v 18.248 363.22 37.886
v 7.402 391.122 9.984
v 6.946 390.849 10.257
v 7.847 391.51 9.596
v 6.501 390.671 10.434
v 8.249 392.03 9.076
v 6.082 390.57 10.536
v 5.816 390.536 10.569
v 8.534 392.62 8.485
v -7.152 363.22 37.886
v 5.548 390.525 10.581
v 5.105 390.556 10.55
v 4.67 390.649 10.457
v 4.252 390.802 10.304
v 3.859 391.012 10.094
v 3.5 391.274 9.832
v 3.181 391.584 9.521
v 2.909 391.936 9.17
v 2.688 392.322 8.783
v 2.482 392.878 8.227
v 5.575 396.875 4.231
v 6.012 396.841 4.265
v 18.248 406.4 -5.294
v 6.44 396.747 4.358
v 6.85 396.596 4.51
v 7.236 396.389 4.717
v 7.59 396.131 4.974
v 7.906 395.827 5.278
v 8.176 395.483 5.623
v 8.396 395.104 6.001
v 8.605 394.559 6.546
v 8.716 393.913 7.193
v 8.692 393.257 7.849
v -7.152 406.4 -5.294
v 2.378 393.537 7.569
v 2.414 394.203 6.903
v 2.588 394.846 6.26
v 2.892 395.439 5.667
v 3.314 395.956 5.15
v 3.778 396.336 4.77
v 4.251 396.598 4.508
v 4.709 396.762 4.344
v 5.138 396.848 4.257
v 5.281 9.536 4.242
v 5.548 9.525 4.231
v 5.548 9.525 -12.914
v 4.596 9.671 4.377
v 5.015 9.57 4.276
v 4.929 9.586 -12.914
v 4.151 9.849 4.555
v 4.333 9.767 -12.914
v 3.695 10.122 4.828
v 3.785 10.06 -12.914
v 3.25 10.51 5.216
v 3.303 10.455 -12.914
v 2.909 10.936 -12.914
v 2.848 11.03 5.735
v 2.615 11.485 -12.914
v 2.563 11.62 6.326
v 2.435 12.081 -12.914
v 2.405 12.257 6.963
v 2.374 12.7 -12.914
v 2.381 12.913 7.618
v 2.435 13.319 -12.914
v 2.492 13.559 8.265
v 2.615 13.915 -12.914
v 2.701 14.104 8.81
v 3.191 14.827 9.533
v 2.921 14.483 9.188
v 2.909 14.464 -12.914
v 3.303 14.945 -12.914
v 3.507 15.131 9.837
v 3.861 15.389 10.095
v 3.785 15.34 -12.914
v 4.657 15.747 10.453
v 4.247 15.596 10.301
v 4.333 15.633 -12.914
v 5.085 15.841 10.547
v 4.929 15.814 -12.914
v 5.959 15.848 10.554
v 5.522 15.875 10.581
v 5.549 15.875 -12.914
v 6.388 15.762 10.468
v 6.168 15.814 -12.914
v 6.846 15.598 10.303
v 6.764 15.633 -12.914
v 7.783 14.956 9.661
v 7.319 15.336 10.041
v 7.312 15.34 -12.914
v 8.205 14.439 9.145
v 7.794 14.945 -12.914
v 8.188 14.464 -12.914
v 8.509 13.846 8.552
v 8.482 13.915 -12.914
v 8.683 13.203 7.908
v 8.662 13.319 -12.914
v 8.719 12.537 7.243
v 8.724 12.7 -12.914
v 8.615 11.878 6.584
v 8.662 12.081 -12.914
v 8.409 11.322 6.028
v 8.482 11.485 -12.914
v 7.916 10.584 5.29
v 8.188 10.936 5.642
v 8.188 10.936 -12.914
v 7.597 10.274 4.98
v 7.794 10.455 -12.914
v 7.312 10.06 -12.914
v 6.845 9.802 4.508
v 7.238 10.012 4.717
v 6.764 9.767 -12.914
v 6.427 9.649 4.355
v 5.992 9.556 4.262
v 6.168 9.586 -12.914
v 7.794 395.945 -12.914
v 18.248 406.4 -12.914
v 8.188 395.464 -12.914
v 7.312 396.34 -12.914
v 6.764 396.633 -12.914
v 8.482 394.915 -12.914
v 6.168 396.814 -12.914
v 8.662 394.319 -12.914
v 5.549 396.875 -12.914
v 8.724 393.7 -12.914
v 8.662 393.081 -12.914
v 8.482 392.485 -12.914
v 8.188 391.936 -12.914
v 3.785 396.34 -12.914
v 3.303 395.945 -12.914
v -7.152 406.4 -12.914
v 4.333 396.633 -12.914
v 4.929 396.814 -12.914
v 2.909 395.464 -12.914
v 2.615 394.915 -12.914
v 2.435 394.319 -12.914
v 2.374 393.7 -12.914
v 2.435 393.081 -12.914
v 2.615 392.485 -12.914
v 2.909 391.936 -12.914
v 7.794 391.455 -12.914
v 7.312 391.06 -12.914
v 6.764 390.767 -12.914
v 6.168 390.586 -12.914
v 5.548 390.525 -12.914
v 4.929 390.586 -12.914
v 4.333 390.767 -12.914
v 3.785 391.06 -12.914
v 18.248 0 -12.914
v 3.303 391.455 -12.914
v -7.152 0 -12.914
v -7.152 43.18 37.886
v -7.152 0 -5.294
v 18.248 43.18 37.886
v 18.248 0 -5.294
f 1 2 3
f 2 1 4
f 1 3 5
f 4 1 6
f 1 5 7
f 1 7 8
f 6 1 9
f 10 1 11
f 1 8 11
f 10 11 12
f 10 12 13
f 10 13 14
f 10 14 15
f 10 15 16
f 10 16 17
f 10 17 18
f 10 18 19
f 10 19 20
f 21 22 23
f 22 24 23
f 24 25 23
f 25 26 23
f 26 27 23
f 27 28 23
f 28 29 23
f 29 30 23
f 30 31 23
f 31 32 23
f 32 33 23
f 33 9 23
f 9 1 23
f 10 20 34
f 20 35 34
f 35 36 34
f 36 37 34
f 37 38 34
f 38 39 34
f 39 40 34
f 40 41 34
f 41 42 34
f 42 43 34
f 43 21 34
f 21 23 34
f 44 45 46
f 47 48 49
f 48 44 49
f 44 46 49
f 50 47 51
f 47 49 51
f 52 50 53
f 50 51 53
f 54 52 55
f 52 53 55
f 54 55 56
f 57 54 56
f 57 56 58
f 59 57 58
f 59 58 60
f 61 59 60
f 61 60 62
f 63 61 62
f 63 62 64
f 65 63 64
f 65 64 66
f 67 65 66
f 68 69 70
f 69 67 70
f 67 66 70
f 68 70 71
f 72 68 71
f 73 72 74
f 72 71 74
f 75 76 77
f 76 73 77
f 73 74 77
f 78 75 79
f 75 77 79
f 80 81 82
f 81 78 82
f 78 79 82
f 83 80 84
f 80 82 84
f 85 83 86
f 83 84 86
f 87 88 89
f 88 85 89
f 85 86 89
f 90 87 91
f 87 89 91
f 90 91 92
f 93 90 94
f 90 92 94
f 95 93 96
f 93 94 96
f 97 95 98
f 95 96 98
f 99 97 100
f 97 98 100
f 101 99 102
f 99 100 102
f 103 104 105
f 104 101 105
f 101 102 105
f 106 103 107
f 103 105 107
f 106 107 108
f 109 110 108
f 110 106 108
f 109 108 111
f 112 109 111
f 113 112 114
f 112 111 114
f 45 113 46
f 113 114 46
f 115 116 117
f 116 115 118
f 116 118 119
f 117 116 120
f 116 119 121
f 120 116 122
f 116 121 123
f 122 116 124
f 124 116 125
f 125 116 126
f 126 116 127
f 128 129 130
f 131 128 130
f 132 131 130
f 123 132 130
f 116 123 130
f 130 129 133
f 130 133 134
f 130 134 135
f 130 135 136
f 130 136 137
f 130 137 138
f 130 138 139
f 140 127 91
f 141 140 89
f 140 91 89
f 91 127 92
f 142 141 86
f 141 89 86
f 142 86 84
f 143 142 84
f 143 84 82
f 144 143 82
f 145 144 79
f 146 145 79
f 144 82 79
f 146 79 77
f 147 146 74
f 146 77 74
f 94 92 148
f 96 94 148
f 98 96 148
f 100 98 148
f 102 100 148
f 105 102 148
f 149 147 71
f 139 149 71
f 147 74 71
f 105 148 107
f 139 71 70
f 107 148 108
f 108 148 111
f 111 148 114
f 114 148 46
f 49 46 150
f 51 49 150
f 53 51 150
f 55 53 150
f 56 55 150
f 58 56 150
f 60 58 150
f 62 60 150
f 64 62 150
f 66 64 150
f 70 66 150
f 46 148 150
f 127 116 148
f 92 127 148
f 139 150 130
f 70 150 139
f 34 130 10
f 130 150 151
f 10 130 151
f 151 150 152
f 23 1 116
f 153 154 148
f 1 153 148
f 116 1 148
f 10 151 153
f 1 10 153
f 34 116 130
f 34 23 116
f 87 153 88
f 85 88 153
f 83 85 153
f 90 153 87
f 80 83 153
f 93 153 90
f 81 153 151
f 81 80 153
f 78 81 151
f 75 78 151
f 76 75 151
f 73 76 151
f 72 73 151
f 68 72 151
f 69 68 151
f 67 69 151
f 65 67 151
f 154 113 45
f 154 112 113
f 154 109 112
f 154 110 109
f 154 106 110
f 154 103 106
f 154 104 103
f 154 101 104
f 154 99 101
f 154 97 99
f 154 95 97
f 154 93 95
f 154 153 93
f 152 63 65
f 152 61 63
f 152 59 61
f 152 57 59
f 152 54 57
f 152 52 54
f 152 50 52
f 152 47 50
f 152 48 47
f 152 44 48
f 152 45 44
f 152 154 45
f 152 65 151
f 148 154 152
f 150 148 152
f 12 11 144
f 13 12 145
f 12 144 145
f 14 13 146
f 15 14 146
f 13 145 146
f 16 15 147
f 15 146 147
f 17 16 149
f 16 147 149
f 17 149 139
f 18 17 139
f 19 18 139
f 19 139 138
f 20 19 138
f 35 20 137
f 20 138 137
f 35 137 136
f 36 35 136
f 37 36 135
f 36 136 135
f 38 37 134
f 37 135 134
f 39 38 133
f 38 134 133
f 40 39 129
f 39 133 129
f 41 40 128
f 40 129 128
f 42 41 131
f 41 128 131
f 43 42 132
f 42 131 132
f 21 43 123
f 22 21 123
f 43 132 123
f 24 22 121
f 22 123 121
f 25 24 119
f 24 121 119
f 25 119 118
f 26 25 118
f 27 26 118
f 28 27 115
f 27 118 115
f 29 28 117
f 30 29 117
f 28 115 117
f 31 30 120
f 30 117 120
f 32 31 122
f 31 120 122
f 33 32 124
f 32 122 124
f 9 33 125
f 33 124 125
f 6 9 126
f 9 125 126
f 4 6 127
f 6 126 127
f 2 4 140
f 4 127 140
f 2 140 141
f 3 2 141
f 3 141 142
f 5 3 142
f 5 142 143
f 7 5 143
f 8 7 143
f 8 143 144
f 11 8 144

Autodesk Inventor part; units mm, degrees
ref_plane "YZ Plane" through (0, 0, 0) normal (1, 0, 0) x (0, 1, 0)
ref_plane "XZ Plane" through (0, 0, 0) normal (0, 1, 0) x (-1, 0, 0)
ref_plane "XY Plane" through (0, 0, 0) normal (0, 0, 1) x (1, 0, 0)
sketch "Sketch1" plane through (0, 0, 0) normal (0, 1, 0) x (-1, 0, 0)
  line L0 (7.1515, 37.8857) -> (-18.2485, 37.8857)
  line L1 (-18.2485, 37.8857) -> (-18.2485, -12.9143)
  line L2 (-18.2485, -12.9143) -> (7.1515, -12.9143)
  line L3 (7.1515, -12.9143) -> (7.1515, 37.8857)
  point P0 (0, 0)
  dimension "d0" = 25.4
  dimension "d1" = 50.8
extrude "Extrusion1" add sketch "Sketch1" along normal blind 406.4
chamfer "Chamfer1" distance 43.18 angle 45 2 edges at (5.5485, 406.4, 37.8857) (5.5485, 0, 37.8857)
sketch "Sketch2" plane through (-7.1515, 43.18, 37.8857) normal (0, 0, 1) x (1, 0, 0)
  circle A0 centre (12.7, 350.52) radius 3.175
  line L0 (25.4, 363.22) -> (0, 363.22) projected
  circle A1 centre (12.7, -30.48) radius 3.175
  line L1 (0, -43.18) -> (25.4, -43.18) projected
  point P0 (7.1515, -43.18)
  dimension "d7" = 6.35
  dimension "d8" = 12.7
  dimension "d9" = 6.35
  dimension "d10" = 12.7
hole "Hole1" at (5.5485, 393.7, 37.8857) at (5.5485, 12.7, 37.8857) direction (0, 0, -1) diameter 6.35 end through all
properties part number "slanted_alum_bar"
